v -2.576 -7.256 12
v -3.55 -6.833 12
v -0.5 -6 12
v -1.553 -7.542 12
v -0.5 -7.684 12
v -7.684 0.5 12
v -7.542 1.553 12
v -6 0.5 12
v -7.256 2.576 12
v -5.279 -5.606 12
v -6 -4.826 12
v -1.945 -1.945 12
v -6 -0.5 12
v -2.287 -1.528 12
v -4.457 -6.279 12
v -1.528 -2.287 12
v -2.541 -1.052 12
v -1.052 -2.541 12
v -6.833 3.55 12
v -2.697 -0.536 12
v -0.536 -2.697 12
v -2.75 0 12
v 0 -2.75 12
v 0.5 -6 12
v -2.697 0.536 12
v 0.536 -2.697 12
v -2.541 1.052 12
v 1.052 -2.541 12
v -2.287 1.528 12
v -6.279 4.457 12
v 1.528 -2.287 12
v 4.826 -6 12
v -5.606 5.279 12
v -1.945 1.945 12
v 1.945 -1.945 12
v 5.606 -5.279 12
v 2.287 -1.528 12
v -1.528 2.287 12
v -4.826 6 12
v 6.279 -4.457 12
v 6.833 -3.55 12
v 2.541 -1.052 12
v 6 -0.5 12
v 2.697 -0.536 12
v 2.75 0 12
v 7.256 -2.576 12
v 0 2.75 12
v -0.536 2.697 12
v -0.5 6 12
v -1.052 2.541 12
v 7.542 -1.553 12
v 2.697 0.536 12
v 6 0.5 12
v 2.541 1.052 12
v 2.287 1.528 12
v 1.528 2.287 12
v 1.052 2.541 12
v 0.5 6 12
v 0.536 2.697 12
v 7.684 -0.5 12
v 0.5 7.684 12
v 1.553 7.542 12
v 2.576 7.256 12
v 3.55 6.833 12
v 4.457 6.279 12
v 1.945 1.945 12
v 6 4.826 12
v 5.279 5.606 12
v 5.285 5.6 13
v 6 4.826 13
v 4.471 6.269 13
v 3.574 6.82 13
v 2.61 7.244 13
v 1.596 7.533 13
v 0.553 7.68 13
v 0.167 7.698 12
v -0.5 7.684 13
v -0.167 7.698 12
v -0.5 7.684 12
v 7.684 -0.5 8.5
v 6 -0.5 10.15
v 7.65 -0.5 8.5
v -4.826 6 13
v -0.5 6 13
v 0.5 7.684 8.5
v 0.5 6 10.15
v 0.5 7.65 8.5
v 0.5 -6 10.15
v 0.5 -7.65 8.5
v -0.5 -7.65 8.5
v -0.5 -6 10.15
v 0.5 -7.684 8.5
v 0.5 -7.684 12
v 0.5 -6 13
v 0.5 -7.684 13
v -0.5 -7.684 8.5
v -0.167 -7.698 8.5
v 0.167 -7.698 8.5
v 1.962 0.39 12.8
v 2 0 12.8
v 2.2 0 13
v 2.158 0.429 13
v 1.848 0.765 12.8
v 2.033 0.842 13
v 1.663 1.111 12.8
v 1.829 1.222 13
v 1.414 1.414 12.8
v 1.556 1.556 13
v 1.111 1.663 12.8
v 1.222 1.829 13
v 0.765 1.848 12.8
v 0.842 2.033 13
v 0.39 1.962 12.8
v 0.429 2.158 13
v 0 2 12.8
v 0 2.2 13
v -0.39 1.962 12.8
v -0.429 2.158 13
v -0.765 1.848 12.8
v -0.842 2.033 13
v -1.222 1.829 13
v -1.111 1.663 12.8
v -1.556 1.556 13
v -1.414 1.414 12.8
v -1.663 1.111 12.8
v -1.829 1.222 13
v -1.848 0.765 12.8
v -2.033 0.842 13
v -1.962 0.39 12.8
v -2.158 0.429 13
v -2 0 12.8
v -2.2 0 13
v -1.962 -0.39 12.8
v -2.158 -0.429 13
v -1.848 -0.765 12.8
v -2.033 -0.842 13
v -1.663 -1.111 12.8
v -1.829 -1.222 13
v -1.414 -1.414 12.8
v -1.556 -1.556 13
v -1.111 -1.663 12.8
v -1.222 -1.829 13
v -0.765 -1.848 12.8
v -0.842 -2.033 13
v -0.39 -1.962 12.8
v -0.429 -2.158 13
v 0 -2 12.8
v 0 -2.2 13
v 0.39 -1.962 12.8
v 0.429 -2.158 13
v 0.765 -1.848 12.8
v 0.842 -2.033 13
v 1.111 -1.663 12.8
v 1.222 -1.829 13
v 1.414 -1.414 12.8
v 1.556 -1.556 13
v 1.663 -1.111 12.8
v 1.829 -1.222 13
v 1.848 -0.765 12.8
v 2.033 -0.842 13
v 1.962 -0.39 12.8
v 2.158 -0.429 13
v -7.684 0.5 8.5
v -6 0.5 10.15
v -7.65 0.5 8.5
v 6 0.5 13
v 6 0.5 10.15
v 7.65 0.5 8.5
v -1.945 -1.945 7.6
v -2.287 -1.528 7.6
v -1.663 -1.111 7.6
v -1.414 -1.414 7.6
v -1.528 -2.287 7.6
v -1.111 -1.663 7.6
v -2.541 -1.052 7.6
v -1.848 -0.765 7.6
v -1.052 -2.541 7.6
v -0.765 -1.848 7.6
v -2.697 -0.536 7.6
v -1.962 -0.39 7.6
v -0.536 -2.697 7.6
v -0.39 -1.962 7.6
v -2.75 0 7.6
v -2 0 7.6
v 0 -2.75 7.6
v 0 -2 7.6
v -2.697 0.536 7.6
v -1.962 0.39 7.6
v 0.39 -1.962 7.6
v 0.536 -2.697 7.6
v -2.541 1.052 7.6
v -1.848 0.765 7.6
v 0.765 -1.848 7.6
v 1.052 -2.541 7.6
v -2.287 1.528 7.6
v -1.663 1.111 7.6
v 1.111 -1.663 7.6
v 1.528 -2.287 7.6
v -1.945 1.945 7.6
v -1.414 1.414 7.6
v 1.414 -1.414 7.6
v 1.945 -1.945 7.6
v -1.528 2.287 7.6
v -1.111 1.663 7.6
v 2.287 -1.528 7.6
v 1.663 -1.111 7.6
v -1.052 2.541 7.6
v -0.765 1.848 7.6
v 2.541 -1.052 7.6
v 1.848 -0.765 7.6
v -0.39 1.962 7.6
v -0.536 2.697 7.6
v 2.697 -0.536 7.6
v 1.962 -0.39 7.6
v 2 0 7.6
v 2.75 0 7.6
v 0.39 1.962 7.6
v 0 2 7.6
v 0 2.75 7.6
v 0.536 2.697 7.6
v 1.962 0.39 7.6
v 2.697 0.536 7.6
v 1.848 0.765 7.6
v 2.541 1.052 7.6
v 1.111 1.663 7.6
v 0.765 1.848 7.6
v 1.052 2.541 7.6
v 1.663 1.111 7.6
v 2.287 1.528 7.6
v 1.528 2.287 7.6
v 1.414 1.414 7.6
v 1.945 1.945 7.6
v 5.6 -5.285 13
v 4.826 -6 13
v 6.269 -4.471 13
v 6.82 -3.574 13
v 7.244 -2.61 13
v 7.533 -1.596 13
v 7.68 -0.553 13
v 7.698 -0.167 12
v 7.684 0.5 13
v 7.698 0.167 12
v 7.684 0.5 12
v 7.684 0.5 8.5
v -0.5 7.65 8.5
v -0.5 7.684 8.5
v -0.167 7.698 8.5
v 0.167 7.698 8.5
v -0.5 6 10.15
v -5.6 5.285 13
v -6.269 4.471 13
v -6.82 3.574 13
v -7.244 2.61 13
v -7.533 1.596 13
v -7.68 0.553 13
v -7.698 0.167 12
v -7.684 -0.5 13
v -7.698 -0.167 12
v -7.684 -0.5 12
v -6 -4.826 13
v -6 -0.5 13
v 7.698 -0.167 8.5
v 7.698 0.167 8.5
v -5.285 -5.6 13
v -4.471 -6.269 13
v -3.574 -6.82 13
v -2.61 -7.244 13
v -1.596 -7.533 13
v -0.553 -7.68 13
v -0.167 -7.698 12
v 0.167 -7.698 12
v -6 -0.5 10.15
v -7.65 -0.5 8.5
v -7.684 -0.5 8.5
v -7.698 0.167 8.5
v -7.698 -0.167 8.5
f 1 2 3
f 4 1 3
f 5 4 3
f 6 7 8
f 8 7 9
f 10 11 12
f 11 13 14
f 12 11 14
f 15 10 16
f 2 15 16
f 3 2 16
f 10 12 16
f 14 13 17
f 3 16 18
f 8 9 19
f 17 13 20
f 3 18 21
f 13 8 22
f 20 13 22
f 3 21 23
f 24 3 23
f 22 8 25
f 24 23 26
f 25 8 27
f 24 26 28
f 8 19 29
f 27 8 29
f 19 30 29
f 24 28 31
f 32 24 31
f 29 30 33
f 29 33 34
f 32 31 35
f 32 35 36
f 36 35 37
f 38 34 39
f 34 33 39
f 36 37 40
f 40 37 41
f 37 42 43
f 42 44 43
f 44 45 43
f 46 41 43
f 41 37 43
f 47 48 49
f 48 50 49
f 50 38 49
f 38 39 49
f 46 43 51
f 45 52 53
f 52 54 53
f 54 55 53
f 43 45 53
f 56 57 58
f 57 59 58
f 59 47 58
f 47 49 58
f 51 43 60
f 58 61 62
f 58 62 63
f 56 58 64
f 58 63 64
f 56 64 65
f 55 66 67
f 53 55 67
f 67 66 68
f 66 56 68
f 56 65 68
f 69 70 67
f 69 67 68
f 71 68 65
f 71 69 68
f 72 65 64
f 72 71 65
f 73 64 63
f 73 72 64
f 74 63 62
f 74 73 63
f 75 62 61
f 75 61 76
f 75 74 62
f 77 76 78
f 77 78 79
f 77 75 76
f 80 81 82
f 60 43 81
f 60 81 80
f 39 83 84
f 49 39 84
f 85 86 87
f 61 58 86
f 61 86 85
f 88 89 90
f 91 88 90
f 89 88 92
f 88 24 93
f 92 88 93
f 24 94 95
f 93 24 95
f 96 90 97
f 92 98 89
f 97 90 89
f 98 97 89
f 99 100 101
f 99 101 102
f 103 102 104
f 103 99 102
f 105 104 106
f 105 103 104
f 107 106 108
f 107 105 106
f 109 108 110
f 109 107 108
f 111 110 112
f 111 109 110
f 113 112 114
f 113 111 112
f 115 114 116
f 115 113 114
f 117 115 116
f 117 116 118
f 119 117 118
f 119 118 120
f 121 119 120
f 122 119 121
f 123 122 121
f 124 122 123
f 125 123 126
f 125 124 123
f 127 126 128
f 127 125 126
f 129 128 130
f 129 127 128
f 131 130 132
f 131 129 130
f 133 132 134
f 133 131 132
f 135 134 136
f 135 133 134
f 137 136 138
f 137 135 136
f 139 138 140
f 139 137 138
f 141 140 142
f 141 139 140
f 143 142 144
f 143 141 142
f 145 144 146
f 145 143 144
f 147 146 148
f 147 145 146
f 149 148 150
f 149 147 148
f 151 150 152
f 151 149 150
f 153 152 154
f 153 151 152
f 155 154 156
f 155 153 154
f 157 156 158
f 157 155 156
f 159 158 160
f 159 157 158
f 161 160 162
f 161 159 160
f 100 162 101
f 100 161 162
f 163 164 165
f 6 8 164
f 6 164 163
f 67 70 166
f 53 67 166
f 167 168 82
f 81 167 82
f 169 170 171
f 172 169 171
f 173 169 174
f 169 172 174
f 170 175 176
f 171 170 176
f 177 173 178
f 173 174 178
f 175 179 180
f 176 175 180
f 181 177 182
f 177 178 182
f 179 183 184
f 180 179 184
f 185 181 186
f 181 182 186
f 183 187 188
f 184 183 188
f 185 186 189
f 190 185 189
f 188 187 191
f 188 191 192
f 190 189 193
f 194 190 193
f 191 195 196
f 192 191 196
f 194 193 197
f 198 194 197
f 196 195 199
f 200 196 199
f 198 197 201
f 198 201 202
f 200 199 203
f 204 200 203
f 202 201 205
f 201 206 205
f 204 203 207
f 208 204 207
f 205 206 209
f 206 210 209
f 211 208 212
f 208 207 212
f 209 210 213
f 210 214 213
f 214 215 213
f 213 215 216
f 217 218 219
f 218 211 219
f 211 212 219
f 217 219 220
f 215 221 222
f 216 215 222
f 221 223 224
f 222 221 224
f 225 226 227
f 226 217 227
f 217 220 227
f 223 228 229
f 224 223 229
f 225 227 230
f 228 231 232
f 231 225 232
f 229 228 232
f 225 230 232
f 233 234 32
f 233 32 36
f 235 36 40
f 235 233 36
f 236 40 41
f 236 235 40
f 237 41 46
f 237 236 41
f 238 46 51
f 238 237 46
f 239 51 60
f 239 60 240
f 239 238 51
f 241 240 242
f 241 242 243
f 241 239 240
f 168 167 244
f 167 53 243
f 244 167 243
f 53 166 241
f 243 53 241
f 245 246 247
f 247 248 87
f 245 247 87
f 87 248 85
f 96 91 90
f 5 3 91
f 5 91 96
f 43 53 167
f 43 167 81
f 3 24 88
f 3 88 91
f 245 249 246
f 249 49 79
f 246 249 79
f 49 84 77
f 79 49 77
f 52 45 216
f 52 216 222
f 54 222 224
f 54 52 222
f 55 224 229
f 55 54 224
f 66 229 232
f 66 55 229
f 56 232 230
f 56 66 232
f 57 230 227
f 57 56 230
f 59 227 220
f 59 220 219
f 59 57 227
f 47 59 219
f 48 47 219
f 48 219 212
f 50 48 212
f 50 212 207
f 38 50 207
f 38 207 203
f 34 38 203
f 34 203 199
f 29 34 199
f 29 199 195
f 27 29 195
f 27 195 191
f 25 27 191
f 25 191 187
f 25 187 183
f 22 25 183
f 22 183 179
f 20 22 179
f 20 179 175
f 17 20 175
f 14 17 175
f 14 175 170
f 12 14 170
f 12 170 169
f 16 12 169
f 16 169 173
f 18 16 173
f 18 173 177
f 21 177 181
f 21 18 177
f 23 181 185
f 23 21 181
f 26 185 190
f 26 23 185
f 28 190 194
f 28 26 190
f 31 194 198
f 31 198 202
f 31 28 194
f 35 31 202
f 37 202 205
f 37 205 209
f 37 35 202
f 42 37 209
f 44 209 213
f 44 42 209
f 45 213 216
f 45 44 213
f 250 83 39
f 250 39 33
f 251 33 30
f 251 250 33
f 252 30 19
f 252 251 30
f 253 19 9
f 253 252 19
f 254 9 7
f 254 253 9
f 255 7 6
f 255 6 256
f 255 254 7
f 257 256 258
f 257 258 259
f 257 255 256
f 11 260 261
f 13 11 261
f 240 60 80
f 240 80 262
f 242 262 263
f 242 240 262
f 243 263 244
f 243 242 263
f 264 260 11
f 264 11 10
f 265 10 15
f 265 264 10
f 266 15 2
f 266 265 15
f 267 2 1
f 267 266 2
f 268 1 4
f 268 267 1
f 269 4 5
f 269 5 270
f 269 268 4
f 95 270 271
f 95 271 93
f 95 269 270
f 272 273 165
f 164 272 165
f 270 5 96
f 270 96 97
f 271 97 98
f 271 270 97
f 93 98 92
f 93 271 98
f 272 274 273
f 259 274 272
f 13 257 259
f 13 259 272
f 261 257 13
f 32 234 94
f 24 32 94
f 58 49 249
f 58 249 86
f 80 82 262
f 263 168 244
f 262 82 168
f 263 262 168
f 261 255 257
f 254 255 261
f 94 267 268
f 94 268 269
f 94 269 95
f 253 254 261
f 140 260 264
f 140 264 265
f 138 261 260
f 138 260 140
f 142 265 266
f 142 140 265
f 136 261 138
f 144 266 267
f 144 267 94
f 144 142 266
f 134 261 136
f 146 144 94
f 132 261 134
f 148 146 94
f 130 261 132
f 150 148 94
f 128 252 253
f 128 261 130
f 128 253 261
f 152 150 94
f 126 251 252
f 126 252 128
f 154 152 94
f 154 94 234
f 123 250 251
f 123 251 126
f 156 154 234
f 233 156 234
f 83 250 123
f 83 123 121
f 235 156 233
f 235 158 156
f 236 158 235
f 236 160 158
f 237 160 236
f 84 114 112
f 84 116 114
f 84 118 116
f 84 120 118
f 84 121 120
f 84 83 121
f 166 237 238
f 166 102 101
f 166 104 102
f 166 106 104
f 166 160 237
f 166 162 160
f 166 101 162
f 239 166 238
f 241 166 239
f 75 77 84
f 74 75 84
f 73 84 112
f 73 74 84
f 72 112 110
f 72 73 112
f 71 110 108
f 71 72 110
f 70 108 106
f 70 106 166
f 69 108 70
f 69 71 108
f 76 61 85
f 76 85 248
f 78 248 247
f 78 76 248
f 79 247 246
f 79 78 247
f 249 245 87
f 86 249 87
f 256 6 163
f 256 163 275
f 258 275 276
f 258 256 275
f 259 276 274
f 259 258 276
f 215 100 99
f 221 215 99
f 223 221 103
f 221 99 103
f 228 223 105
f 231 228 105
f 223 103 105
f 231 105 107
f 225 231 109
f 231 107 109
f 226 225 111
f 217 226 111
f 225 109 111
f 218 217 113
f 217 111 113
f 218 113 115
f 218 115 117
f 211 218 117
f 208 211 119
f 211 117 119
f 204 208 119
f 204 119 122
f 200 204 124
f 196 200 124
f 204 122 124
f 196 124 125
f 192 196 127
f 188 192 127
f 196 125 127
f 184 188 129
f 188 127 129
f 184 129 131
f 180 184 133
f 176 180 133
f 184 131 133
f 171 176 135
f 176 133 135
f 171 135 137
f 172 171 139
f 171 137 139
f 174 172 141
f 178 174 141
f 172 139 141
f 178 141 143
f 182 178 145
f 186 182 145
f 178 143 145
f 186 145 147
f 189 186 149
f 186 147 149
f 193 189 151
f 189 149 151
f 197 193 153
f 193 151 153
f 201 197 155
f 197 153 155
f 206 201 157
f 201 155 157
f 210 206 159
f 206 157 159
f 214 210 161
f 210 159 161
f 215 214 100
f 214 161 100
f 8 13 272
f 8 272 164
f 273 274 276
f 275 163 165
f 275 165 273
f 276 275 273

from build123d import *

# Parameters (mm, degrees)
F1_R      = 2.75
F1_R_2    = 2
F2_DEPTH  = 5.4
F4_R      = 7.7
F4_R_2    = 2
F5_DEPTH  = 1
F8_DEPTH  = 213
F11_DEPTH = 3.5
F12_SIZE  = 1.65
F13_SIZE  = 0.2


with BuildPart() as f2:
    # F1 (on offset) → F2 (new body)
    with BuildSketch(Plane.XY.offset(13)):
        Circle(F1_R)
        Circle(F1_R_2, mode=Mode.SUBTRACT)
    extrude(amount=-F2_DEPTH)

    # F4 (on offset) → F5 (join)
    with BuildSketch(Plane.XY.offset(13)):
        Circle(F4_R)
        Circle(F4_R_2, mode=Mode.SUBTRACT)
    extrude(amount=-F5_DEPTH)

    # F7 (on offset) → F8 (cut)
    with BuildSketch(Plane.XY.offset(13)):
        with BuildLine():
            Line((-0.5, 6), (-0.5, 7.683749))
            ThreePointArc((-0.5, 7.683749), (-2.792892, 7.175636), (-4.825971, 6))
            Line((-4.825971, 6), (-0.5, 6))
        make_face()
        with BuildLine():
            Line((-6, -0.5), (-7.683749, -0.5))
            ThreePointArc((-7.683749, -0.5), (-7.175636, -2.792892), (-6, -4.825971))
            Line((-6, -4.825971), (-6, -0.5))
        make_face()
        with BuildLine():
            Line((0.5, -6), (0.5, -7.683749))
            ThreePointArc((0.5, -7.683749), (2.792892, -7.175636), (4.825971, -6))
            Line((4.825971, -6), (0.5, -6))
        make_face()
        with BuildLine():
            ThreePointArc((7.683749, 0.5), (7.175636, 2.792892), (6, 4.825971))
            Line((6, 4.825971), (6, 0.5))
            Line((6, 0.5), (7.683749, 0.5))
        make_face()
    extrude(amount=-F8_DEPTH, mode=Mode.SUBTRACT)

    # F10 (on offset) → F11 (join)
    with BuildSketch(Plane.XY.offset(12)):
        with BuildLine():
            Line((-6, 0.5), (-7.683749, 0.5))
            ThreePointArc((-7.683749, 0.5), (-7.7, 0), (-7.683749, -0.5))
            Line((-7.683749, -0.5), (-6, -0.5))
            Line((-6, -0.5), (-6, 0.5))
        make_face()
        with BuildLine():
            ThreePointArc((0.5, 7.683749), (0, 7.7), (-0.5, 7.683749))
            Line((-0.5, 7.683749), (-0.5, 6))
            Line((-0.5, 6), (0.5, 6))
            Line((0.5, 6), (0.5, 7.683749))
        make_face()
        with BuildLine():
            Line((7.683749, 0.5), (6, 0.5))
            Line((6, 0.5), (6, -0.5))
            Line((6, -0.5), (7.683749, -0.5))
            ThreePointArc((7.683749, -0.5), (7.7, 0), (7.683749, 0.5))
        make_face()
        with BuildLine():
            ThreePointArc((-0.5, -7.683749), (0, -7.7), (0.5, -7.683749))
            Line((0.5, -7.683749), (0.5, -6))
            Line((0.5, -6), (-0.5, -6))
            Line((-0.5, -6), (-0.5, -7.683749))
        make_face()
    extrude(amount=-F11_DEPTH)

    # F12
    f12_edges = [f2.edges().sort_by_distance(p)[0] for p in [
        (-6, 0, 8.5),
        (0, 6, 8.5),
        (6, 0, 8.5),
        (0, -6, 8.5),
    ]]
    chamfer(f12_edges, length=F12_SIZE)

    # F13
    f13_edges = [f2.edges().sort_by_distance(p)[0] for p in [
        (-2, 0, 13),
    ]]
    chamfer(f13_edges, length=F13_SIZE)


solid = f2.part
